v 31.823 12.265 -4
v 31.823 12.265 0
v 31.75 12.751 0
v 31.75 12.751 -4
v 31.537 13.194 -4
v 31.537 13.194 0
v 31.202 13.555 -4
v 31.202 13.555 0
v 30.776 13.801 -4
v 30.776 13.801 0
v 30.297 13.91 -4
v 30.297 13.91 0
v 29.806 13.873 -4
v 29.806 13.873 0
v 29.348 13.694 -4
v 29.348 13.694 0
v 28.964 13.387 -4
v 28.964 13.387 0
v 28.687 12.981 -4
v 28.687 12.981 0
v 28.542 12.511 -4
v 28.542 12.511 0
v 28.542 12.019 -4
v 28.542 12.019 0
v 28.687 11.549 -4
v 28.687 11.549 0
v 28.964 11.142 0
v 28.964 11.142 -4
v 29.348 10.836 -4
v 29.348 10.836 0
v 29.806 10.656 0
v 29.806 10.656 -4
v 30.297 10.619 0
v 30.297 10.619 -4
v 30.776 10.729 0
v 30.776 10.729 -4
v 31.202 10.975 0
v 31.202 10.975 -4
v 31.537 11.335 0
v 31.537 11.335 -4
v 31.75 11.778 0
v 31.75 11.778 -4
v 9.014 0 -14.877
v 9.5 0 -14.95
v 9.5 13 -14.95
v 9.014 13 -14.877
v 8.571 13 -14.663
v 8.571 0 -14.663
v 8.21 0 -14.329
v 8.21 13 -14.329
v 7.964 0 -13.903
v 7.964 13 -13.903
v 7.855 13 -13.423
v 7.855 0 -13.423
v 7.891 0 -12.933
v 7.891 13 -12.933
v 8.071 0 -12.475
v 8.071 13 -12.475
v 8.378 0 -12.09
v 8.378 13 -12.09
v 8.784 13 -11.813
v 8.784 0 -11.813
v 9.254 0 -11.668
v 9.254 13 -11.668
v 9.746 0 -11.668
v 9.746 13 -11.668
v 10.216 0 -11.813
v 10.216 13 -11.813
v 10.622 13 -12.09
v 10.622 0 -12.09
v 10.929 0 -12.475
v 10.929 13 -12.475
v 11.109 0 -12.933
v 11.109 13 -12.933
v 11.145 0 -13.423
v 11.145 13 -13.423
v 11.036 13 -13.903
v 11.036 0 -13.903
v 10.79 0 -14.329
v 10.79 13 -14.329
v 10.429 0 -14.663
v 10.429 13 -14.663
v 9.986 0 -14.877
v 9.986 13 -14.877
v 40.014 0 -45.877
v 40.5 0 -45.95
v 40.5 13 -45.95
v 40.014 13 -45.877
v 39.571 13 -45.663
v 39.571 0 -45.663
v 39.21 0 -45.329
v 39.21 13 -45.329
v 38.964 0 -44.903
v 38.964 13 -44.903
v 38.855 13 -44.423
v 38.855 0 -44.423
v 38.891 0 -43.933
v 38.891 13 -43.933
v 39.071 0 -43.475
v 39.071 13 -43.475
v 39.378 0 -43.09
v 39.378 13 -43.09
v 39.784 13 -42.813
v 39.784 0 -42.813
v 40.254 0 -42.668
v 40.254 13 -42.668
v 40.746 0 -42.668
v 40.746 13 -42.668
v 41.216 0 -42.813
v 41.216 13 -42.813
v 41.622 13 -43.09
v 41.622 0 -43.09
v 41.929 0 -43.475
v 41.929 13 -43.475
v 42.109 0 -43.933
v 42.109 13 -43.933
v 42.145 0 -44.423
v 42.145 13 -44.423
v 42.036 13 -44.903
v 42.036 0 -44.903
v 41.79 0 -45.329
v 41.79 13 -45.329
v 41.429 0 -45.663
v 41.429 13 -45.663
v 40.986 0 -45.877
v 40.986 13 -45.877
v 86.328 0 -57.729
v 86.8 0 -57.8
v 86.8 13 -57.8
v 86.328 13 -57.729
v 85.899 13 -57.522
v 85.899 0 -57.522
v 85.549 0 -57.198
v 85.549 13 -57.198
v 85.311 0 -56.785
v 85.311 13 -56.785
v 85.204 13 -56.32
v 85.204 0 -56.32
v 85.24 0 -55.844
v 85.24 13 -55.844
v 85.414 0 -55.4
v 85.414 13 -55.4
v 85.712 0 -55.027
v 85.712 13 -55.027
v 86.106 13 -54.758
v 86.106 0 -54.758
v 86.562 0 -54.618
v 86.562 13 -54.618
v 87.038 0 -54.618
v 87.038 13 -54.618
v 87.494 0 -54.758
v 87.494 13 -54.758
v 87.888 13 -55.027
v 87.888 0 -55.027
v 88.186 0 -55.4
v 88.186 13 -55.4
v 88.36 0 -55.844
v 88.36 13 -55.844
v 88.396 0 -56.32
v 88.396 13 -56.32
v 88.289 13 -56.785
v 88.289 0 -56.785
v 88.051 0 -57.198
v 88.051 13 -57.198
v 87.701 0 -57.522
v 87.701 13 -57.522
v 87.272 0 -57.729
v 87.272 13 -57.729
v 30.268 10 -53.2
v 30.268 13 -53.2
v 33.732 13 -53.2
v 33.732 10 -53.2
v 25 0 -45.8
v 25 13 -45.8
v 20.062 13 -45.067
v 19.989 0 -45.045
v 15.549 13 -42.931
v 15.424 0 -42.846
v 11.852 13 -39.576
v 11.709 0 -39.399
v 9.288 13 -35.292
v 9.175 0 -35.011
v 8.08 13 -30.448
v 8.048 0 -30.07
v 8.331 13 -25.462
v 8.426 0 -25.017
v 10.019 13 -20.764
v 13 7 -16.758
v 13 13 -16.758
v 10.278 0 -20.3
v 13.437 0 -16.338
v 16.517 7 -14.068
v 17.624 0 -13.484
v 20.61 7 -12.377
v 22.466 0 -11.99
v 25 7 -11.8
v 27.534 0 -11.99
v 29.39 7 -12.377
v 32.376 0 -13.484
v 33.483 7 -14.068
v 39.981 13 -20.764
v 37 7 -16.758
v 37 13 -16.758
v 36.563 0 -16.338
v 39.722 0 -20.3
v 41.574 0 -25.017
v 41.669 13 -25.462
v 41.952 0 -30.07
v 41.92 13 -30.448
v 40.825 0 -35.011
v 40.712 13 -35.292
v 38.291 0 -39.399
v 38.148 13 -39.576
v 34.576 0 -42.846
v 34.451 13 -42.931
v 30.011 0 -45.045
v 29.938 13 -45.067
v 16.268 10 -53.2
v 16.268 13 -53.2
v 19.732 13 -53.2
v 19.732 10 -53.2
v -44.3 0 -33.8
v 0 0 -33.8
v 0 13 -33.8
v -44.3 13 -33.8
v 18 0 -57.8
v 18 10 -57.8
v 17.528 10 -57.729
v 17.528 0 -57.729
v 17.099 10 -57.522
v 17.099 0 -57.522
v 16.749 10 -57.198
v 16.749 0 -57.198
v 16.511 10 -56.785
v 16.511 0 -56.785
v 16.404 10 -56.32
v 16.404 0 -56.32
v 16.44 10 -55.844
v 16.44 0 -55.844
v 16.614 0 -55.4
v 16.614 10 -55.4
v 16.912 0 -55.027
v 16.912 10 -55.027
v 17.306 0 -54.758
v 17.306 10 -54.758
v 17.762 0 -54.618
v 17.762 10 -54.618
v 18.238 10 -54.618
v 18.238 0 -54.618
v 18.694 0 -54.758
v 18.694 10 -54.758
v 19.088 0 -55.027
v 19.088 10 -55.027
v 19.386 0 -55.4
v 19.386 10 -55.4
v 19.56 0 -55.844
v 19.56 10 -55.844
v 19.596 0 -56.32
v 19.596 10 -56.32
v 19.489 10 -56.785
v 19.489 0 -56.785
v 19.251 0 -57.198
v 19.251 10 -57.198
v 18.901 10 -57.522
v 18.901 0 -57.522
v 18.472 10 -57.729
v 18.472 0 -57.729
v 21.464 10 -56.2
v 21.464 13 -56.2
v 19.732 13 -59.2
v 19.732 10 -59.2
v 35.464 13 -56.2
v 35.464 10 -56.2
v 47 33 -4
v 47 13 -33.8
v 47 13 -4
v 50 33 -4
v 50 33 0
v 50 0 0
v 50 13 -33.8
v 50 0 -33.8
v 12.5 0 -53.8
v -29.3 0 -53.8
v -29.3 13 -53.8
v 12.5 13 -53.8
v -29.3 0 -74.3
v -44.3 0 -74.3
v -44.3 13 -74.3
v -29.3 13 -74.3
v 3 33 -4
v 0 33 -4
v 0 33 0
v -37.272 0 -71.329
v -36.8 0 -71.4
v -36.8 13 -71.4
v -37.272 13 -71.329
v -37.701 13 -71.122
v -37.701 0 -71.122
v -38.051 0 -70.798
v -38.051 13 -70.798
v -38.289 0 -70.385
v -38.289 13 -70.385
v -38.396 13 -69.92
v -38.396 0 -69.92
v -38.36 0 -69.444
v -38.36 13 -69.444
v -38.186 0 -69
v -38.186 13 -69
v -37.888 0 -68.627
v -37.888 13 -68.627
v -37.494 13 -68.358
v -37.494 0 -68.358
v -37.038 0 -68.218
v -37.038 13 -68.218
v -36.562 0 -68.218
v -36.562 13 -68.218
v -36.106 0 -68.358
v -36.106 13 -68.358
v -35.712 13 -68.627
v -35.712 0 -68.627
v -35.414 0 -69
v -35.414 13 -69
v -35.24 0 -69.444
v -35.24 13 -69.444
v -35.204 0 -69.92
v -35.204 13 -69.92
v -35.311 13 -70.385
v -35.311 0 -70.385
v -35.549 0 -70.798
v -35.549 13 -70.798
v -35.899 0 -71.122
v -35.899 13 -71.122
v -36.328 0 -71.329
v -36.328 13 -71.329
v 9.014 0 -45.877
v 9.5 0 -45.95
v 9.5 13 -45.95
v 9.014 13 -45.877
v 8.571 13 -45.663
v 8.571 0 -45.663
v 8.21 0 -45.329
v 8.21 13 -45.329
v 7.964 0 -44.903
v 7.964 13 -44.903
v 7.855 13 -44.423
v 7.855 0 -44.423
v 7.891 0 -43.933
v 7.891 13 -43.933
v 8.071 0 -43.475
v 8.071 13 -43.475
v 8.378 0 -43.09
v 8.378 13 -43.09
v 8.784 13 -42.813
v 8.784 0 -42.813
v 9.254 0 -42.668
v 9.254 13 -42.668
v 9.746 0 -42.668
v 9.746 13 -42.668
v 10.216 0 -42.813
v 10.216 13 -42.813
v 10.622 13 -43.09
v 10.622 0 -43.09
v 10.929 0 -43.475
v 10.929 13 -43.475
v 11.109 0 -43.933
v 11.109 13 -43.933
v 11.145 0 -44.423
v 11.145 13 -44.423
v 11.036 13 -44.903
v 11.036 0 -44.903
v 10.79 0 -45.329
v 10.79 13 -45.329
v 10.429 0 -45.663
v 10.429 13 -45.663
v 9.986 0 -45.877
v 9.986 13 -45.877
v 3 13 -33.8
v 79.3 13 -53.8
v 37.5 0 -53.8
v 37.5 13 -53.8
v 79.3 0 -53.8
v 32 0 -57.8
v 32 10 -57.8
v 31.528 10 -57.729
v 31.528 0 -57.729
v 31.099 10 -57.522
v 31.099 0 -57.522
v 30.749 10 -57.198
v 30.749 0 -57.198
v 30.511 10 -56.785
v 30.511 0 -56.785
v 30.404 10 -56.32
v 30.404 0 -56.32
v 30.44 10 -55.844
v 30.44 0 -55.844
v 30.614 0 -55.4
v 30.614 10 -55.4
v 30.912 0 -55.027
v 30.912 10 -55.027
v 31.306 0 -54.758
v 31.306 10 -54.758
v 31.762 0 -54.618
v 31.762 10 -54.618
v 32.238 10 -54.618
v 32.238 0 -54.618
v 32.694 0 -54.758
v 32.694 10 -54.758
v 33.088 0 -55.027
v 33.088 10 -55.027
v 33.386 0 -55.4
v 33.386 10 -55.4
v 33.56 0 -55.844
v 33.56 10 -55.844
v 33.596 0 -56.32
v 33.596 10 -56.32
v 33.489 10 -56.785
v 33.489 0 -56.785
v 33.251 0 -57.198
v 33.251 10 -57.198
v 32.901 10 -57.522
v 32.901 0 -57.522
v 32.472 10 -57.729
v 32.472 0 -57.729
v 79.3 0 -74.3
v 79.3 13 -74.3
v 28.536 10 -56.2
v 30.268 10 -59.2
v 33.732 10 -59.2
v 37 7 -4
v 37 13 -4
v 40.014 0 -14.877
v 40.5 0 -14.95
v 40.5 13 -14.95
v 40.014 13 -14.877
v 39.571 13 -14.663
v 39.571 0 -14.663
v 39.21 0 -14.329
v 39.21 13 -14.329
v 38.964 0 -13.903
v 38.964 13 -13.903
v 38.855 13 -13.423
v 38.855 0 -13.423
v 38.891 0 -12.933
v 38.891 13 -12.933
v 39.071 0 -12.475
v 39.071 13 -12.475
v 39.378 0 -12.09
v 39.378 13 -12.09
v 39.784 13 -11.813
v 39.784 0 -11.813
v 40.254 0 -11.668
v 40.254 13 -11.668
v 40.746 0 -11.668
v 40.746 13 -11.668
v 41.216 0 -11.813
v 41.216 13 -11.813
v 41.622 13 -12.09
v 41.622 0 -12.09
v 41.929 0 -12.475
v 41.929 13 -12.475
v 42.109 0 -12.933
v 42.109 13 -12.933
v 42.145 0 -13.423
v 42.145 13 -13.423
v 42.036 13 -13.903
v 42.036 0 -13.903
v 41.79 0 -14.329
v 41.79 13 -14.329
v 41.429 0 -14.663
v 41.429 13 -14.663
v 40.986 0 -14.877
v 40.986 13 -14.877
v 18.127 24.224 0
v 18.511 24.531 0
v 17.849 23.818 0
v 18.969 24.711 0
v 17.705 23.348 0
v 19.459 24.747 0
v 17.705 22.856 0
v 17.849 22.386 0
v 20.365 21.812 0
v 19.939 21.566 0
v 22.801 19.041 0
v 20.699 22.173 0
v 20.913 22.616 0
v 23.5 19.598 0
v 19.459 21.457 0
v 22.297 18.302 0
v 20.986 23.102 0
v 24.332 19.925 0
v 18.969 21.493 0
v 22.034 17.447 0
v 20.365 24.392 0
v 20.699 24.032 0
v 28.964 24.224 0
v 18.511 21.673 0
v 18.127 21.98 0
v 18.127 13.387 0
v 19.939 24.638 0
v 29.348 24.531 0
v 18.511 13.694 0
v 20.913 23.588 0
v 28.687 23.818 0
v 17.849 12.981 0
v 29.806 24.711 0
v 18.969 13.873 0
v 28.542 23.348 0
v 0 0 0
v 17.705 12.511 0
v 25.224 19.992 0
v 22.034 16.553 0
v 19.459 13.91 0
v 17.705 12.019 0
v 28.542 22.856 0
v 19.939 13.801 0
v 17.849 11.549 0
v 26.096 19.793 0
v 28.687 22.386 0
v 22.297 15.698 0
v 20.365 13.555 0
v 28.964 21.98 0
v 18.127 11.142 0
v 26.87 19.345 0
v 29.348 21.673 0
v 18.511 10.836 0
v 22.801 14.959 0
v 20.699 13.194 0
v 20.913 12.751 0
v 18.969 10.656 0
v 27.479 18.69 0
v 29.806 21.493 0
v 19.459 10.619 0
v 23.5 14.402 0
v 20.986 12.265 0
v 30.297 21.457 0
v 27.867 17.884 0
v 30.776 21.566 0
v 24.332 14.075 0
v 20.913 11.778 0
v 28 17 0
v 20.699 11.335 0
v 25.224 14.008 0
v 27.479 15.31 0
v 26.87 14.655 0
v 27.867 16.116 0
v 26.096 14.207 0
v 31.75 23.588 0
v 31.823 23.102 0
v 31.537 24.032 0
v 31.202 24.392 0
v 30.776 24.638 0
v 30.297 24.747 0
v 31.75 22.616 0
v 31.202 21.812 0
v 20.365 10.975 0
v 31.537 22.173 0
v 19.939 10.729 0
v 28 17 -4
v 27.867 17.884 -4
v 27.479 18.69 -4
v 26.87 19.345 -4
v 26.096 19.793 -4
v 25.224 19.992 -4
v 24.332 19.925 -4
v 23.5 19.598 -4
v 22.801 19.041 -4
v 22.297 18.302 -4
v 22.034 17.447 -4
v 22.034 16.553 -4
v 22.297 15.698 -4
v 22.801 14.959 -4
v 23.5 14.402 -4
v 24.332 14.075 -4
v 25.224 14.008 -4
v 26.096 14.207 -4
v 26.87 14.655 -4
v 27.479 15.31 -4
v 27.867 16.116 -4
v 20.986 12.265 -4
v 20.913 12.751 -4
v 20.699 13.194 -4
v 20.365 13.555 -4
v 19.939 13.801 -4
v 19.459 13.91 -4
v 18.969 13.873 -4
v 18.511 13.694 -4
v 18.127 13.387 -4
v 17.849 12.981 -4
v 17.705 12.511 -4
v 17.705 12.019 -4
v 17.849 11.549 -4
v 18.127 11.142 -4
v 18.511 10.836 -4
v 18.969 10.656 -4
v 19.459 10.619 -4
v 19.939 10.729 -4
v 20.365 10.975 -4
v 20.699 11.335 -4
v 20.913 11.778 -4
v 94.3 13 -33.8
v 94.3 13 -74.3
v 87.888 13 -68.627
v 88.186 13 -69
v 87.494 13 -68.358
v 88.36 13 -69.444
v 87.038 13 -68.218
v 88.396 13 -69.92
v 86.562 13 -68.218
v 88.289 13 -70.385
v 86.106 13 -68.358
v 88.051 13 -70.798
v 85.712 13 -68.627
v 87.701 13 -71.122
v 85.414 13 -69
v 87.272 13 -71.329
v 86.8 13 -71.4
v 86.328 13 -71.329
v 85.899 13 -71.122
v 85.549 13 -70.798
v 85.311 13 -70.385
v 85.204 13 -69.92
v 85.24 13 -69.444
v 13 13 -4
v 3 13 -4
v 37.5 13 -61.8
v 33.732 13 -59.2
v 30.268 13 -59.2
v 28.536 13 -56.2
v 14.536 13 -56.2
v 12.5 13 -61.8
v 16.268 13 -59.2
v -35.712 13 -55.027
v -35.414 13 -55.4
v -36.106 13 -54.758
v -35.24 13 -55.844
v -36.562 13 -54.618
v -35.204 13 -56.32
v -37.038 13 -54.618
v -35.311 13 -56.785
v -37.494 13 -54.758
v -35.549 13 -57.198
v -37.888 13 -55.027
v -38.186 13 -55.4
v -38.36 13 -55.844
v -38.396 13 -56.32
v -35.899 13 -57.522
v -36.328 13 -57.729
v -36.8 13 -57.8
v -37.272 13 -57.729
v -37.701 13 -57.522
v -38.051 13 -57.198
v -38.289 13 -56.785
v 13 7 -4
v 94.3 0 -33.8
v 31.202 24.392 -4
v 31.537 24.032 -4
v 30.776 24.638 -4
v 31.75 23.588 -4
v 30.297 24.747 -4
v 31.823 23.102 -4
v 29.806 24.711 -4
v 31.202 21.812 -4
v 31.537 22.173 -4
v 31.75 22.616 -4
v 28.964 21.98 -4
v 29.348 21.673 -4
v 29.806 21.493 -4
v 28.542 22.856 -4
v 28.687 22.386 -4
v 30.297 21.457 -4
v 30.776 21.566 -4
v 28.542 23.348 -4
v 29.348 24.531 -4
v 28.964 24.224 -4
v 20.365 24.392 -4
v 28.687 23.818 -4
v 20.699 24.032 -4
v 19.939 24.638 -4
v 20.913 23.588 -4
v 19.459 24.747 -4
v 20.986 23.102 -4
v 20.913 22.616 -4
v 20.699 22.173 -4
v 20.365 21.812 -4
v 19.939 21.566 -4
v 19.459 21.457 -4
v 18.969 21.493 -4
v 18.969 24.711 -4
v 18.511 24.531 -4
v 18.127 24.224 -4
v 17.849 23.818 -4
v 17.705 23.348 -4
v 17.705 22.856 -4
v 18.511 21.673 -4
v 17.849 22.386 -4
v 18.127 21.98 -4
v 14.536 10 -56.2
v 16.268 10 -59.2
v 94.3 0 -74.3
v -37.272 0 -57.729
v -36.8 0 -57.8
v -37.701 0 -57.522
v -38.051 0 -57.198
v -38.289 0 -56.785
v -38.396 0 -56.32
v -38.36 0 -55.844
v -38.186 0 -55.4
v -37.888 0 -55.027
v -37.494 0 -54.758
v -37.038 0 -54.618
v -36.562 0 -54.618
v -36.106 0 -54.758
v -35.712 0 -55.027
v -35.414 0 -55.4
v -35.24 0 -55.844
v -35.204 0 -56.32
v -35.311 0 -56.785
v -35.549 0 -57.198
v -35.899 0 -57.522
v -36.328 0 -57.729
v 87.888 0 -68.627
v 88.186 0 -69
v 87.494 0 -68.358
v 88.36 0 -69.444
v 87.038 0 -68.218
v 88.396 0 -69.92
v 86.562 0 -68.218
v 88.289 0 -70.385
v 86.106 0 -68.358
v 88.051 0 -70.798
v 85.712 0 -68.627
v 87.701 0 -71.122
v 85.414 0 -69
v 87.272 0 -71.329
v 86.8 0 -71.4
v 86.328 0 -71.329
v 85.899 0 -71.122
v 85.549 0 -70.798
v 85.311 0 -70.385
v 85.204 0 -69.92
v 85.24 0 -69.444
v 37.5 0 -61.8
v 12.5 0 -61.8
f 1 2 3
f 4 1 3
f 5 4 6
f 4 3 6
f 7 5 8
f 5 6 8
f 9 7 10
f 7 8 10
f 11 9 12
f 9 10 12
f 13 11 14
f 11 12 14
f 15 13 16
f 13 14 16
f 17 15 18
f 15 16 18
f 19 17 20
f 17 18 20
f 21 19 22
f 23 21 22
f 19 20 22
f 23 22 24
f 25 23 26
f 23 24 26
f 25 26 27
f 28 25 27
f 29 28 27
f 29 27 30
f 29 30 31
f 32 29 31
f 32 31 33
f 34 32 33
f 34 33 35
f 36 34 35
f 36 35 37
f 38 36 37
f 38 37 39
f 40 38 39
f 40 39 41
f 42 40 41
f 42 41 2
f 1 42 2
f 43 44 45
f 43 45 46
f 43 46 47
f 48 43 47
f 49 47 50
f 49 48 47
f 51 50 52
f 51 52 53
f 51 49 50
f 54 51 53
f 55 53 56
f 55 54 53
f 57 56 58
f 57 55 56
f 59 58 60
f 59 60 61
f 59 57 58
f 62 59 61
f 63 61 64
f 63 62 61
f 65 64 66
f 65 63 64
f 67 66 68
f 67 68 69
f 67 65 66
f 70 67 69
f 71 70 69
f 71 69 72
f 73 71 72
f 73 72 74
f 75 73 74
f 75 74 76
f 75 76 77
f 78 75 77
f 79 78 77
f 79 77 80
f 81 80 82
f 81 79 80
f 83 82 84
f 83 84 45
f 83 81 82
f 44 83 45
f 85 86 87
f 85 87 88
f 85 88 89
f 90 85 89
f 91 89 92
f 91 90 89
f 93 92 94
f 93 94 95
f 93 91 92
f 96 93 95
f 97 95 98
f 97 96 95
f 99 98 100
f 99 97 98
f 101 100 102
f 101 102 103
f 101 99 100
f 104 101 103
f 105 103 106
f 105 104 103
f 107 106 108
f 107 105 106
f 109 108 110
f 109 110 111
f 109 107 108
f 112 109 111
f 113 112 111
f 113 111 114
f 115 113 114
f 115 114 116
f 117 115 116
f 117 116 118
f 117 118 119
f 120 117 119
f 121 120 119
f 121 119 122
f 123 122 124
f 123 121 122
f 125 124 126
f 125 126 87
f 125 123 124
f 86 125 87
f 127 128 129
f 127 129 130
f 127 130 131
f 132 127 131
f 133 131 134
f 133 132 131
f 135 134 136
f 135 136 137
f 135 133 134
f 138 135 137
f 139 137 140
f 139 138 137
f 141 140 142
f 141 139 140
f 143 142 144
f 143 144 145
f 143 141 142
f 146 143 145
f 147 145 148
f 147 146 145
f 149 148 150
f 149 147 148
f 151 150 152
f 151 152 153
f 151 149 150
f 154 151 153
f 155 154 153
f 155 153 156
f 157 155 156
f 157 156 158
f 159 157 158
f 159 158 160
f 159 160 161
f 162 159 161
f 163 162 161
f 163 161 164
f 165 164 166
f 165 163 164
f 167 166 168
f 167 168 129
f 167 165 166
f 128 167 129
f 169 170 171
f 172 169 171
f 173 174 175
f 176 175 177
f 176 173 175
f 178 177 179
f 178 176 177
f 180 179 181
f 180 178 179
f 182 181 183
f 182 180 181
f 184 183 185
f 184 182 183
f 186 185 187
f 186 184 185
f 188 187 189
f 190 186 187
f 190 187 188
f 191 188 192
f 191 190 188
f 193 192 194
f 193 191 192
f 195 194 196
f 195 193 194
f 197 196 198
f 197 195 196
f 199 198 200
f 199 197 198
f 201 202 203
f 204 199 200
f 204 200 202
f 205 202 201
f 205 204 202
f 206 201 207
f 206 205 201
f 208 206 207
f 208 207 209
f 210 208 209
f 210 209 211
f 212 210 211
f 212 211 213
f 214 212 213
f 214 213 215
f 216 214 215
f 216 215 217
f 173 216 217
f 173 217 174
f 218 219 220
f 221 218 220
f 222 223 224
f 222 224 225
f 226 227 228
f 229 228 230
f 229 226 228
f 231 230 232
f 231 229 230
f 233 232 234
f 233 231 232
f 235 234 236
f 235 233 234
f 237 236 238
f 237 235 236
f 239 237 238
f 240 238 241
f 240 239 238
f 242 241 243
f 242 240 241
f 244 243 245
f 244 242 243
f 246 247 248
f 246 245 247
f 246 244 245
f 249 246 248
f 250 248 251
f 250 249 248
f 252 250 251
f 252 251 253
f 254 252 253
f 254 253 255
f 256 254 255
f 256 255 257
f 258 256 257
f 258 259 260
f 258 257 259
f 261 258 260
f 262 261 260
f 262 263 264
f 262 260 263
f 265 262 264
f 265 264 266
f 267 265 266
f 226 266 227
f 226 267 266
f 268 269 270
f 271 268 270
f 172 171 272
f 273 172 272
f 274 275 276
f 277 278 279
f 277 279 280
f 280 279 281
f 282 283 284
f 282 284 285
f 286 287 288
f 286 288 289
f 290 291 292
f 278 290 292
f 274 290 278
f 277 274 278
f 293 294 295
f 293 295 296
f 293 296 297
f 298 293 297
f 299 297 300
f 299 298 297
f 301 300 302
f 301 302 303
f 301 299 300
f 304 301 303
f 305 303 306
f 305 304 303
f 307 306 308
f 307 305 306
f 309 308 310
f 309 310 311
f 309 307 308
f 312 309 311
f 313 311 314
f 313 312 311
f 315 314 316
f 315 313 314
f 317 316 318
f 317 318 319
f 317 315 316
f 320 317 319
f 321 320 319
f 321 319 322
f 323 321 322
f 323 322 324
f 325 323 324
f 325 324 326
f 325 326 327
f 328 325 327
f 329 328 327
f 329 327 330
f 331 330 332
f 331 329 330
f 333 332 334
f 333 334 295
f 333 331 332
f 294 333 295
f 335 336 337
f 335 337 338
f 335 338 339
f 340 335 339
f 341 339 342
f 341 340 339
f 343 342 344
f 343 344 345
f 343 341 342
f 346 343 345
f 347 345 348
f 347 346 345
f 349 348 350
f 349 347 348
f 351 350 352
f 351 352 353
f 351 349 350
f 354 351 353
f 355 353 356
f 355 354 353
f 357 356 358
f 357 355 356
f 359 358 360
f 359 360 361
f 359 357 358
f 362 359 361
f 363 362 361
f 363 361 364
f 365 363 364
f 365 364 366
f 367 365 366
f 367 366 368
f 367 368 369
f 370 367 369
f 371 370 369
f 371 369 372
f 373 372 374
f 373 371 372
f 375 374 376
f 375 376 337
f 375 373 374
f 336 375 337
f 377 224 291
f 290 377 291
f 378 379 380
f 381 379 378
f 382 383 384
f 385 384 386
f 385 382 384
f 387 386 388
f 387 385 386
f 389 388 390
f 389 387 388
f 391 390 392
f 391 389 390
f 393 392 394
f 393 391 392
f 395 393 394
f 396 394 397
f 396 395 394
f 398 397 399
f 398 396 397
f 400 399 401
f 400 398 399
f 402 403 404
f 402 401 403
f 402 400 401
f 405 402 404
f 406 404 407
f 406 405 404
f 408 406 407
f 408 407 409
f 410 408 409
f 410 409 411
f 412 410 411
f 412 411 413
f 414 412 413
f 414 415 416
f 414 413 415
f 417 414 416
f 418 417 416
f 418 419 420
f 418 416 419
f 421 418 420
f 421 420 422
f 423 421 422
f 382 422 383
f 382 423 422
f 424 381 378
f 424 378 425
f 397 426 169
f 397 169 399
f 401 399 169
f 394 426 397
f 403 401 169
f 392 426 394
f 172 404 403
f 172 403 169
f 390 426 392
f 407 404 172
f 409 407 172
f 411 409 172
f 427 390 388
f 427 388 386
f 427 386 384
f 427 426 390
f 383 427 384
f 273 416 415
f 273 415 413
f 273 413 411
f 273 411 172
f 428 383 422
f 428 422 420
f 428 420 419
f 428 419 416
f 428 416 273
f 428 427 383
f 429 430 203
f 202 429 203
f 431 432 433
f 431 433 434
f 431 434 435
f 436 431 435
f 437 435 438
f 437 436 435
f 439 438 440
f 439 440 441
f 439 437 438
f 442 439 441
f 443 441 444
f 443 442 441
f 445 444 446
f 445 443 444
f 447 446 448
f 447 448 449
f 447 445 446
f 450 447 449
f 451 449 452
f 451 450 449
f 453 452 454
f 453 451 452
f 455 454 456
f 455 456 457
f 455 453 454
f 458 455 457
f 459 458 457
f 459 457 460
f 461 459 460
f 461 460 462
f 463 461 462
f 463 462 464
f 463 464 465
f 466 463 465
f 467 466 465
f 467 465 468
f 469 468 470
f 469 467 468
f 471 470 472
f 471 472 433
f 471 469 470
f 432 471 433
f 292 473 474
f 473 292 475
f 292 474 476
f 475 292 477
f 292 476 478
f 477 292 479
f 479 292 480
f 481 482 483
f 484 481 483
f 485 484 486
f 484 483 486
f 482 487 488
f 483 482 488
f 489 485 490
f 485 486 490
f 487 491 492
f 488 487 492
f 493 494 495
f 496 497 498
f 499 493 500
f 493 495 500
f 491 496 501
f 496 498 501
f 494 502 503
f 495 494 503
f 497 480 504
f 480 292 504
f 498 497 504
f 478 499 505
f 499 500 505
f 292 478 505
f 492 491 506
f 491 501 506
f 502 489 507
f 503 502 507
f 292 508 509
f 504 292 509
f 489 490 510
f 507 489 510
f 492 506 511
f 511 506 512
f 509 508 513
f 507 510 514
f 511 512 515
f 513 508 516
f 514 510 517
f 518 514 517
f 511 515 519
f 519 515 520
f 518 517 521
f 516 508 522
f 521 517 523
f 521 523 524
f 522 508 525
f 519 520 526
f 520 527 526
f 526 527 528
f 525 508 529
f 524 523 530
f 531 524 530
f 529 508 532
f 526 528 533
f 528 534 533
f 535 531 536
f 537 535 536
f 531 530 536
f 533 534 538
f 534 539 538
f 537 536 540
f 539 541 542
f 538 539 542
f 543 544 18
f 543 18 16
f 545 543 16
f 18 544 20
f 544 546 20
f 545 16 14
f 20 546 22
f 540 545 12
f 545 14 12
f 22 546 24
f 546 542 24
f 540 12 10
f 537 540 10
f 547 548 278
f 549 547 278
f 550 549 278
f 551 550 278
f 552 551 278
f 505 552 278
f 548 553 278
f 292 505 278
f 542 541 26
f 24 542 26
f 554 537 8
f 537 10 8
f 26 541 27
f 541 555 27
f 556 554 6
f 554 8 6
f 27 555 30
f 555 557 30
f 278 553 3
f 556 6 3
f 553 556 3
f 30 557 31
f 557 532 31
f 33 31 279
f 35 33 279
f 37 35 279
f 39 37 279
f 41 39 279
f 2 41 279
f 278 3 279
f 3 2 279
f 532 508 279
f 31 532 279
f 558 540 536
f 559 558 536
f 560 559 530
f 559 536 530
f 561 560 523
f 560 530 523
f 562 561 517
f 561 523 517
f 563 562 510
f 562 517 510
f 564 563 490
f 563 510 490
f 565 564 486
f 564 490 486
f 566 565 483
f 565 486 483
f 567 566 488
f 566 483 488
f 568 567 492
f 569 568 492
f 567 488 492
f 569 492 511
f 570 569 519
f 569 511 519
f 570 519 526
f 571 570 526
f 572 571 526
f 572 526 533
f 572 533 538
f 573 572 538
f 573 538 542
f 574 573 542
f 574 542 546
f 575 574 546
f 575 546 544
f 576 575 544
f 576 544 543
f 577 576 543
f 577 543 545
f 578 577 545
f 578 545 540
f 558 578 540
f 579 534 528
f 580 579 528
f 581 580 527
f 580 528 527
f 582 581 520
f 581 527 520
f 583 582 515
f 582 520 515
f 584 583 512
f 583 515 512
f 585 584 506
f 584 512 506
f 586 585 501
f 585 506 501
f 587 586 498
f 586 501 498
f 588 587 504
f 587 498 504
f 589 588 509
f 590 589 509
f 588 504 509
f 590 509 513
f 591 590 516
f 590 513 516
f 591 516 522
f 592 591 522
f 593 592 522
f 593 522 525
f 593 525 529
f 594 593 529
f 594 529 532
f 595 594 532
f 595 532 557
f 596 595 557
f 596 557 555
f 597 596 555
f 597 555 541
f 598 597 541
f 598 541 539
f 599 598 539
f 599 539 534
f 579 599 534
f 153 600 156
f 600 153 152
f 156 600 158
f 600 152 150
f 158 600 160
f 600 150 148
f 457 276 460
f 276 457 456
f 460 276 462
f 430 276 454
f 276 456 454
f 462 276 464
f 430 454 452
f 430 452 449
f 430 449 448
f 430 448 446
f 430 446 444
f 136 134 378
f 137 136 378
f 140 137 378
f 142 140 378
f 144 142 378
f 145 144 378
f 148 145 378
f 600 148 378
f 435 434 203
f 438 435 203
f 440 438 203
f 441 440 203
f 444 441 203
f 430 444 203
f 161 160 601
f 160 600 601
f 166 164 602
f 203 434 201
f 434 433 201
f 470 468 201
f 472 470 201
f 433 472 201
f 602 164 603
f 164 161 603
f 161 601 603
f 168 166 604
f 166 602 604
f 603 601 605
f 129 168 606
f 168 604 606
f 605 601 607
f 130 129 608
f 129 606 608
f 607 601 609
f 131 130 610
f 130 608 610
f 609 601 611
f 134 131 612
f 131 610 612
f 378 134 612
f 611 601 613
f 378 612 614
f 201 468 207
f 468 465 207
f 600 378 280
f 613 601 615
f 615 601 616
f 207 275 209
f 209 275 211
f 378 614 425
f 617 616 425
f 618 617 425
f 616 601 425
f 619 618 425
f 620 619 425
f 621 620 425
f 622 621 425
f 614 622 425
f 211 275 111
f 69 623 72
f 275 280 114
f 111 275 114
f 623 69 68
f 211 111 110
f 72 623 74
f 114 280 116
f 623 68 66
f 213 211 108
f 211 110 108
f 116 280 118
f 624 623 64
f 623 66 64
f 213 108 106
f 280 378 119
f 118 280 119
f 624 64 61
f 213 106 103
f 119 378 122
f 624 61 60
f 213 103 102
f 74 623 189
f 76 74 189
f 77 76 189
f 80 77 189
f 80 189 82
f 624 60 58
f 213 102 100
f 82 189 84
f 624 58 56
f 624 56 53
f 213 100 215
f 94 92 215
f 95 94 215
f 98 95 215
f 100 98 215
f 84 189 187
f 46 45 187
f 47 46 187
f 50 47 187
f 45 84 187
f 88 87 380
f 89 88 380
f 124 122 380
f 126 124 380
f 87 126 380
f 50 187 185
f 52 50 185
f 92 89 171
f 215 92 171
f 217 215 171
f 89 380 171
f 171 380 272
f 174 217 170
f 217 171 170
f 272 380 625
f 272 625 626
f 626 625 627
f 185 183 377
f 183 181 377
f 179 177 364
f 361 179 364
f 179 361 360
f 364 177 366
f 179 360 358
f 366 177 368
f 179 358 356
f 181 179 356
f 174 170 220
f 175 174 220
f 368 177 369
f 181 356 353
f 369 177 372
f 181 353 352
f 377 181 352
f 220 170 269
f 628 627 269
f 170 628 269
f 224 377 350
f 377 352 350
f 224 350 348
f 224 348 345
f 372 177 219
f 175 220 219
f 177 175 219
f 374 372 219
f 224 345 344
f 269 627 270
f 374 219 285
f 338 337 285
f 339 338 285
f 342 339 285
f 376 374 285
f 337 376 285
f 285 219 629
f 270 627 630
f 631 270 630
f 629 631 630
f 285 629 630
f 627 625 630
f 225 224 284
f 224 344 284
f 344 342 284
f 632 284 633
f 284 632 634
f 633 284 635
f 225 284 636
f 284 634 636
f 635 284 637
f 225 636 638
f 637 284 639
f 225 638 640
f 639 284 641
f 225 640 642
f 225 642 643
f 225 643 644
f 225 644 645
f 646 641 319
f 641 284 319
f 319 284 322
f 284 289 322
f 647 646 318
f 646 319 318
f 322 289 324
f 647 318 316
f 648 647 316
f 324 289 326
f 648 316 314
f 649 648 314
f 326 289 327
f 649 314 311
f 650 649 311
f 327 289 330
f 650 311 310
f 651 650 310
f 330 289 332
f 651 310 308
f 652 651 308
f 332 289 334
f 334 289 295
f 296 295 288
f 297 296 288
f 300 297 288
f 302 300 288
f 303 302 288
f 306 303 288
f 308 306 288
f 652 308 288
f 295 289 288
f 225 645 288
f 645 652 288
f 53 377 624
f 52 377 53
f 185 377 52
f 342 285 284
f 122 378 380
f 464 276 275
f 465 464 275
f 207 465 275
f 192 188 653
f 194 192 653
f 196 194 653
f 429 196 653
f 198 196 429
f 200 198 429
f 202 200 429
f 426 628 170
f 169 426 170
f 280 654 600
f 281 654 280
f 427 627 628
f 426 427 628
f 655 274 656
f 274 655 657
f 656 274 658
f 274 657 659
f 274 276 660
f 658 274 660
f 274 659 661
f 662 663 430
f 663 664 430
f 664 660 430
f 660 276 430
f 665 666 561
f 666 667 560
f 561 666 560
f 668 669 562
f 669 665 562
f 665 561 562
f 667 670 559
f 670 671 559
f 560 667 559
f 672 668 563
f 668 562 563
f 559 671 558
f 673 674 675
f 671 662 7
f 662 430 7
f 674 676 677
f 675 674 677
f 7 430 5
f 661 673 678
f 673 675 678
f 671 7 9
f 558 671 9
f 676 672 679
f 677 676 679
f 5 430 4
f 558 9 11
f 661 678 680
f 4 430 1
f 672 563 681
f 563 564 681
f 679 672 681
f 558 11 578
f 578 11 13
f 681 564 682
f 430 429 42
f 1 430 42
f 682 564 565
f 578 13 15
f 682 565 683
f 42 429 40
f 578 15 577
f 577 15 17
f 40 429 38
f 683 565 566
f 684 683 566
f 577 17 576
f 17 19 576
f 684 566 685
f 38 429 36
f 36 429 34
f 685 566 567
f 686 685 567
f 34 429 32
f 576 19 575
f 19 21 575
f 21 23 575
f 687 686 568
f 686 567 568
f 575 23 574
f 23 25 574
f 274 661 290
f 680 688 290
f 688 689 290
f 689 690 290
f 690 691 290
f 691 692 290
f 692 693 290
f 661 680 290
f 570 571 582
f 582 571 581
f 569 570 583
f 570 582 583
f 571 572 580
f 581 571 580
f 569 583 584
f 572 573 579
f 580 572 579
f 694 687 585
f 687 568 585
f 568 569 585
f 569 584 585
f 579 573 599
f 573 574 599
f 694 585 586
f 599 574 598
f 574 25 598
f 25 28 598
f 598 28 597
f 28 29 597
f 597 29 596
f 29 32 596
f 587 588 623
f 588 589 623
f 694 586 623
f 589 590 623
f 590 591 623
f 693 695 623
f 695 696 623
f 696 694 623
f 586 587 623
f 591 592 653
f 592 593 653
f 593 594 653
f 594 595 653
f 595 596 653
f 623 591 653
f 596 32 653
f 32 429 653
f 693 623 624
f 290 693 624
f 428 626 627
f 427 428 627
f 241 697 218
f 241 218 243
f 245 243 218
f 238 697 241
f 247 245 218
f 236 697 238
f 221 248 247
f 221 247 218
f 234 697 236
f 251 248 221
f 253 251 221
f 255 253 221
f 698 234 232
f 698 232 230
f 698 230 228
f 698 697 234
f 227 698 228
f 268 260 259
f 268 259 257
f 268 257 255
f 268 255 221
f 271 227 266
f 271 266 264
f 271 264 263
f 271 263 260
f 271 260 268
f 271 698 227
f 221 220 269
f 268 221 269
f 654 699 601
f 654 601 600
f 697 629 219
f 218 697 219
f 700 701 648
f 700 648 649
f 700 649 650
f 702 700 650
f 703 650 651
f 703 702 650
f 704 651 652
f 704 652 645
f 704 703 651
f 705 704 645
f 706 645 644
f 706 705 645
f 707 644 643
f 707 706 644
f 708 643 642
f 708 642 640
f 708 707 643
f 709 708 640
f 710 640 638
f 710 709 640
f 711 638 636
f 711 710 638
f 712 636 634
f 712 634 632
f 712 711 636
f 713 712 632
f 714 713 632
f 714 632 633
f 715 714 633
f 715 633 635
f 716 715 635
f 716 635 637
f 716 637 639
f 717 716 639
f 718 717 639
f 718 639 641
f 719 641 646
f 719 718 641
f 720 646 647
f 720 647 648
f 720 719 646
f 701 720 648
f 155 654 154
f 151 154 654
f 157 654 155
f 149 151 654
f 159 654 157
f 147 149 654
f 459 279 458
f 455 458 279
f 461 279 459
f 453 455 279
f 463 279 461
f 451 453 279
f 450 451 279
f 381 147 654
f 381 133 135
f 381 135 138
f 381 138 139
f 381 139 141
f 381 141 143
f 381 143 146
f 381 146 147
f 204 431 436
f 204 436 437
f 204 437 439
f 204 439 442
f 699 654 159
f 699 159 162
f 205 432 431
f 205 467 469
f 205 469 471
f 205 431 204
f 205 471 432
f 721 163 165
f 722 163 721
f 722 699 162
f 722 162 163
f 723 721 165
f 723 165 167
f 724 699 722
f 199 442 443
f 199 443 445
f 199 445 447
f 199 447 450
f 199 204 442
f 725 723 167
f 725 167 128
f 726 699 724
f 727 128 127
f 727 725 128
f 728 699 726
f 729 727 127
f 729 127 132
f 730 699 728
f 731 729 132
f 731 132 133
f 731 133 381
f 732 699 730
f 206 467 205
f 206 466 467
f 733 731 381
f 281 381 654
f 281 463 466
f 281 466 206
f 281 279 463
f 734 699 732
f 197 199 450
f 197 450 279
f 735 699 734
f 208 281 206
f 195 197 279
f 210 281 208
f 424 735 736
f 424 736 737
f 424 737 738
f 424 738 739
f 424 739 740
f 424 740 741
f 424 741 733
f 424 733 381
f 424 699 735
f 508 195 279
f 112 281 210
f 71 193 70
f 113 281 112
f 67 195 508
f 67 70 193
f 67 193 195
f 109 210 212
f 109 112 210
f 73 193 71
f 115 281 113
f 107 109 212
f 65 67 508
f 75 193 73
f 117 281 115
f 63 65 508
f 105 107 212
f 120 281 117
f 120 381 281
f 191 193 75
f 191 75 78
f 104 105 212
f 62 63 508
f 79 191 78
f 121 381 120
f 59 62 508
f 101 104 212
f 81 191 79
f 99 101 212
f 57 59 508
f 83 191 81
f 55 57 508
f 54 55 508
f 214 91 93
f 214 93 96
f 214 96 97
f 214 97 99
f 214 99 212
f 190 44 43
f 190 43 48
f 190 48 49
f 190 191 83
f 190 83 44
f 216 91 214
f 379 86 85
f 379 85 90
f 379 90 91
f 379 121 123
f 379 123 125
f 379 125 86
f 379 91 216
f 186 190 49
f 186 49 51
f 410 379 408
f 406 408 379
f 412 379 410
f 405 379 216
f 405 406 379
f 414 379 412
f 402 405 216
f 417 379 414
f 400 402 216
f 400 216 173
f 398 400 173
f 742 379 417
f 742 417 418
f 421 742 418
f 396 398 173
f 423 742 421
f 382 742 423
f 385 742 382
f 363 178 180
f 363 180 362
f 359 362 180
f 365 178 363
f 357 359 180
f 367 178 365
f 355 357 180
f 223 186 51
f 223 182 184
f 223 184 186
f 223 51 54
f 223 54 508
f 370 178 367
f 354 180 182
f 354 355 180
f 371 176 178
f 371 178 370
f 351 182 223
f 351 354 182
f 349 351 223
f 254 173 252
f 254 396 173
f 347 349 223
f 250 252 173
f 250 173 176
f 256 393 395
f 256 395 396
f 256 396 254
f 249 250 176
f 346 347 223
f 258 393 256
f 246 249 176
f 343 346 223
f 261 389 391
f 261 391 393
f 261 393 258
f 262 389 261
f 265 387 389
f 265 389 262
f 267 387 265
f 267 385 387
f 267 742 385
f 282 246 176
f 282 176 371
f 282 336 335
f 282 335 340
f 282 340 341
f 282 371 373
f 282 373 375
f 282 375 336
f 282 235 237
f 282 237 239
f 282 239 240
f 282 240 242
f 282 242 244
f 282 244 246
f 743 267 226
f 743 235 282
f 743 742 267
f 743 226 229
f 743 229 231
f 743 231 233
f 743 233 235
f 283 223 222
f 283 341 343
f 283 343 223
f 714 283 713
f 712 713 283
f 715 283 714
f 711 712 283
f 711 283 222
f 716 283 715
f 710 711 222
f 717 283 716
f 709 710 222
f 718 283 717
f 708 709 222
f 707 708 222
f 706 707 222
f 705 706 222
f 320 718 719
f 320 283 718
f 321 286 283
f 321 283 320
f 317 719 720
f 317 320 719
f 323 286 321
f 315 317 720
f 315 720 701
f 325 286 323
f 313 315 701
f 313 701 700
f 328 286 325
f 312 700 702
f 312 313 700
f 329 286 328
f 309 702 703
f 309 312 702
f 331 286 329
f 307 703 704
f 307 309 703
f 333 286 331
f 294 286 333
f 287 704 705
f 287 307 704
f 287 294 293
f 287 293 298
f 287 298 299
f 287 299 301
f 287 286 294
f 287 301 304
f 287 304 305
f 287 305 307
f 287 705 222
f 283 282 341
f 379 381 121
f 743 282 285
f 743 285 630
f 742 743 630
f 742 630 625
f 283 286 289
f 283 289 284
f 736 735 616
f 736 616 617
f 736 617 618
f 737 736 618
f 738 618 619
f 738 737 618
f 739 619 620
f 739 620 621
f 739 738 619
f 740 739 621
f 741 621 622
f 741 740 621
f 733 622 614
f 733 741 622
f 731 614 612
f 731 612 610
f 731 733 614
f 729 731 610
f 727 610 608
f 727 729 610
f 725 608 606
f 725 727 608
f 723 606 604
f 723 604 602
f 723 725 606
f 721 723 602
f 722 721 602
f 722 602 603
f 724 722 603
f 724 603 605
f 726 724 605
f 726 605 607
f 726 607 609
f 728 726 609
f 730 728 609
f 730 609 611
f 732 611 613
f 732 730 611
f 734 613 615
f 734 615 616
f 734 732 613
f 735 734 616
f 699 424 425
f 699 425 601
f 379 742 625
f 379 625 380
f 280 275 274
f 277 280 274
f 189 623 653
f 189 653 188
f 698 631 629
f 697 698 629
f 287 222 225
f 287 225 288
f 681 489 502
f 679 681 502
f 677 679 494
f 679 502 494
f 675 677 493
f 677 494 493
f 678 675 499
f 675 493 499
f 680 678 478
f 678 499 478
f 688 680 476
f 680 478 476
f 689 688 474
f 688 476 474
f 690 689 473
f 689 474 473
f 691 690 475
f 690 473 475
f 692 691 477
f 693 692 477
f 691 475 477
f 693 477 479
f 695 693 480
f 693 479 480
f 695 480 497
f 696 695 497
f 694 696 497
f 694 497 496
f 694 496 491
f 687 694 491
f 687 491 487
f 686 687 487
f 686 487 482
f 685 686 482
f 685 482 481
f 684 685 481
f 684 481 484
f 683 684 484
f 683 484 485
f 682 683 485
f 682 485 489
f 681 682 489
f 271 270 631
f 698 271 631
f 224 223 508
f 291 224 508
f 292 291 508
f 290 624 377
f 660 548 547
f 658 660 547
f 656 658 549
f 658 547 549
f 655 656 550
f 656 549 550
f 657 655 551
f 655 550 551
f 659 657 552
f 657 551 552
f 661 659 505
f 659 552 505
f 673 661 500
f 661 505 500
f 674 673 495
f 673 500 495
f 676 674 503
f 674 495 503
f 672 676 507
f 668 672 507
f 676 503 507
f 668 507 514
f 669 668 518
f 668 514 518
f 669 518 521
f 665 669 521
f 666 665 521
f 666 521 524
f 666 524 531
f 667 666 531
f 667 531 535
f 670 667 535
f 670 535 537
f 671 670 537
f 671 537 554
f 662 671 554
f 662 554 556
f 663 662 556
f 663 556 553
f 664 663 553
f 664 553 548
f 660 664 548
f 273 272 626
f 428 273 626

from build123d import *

# Parameters (mm, degrees)
SKETCH_2_R          = 1.6
SKETCH_2_R_2        = 17
SKETCH_2_R_3        = 1.65
EXTRUDE_2_DEPTH     = 13
CUT_EXTRUDE_1_DEPTH = 3
EXTRUDE_3_DEPTH     = 20
CUT_EXTRUDE_2_DEPTH = 125.506947597
SKETCH_8_W          = 24
SKETCH_8_H          = 20
CUT_EXTRUDE_3_DEPTH = 6
SKETCH_10_R         = 3
SKETCH_10_R_2       = 1.65
CUT_EXTRUDE_4_DEPTH = 5


with BuildPart() as part:
    # 草图2 → 凸台-拉伸2 (new body)
    with BuildSketch(Plane(origin=(0, 0, 0), x_dir=(1, 0, 0), z_dir=(0, 1, 0))):
        Polygon((-44.3, 33.8), (-44.3, 74.3), (-29.3, 74.3), (-29.3, 53.8), (12.5, 53.8), (12.5, 61.8), (37.5, 61.8), (37.5, 53.8), (79.3, 53.8), (79.3, 74.3), (94.3, 74.3), (94.3, 33.8), (50, 33.8), (50, 0), (0, 0), (0, 33.8), align=None)
        with Locations(Location((-36.8, 69.8, 0), (0, 0, 90))):
            Circle(SKETCH_2_R, mode=Mode.SUBTRACT)
        with Locations(Location((-36.8, 56.2, 0), (0, 0, 90))):
            Circle(SKETCH_2_R, mode=Mode.SUBTRACT)
        with Locations(Location((86.8, 69.8, 0), (0, 0, 90))):
            Circle(SKETCH_2_R, mode=Mode.SUBTRACT)
        with Locations(Location((86.8, 56.2, 0), (0, 0, 90))):
            Circle(SKETCH_2_R, mode=Mode.SUBTRACT)
        with Locations(Location((18, 56.2, 0), (0, 0, 90))):
            Circle(SKETCH_2_R, mode=Mode.SUBTRACT)
        with Locations(Location((32, 56.2, 0), (0, 0, 90))):
            Circle(SKETCH_2_R, mode=Mode.SUBTRACT)
        with Locations(Location((25, 28.8, 0), (0, 0, 90))):
            Circle(SKETCH_2_R_2, mode=Mode.SUBTRACT)
        with Locations(Location((40.5, 44.3, 0), (0, 0, 90))):
            Circle(SKETCH_2_R_3, mode=Mode.SUBTRACT)
        with Locations(Location((40.5, 13.3, 0), (0, 0, 90))):
            Circle(SKETCH_2_R_3, mode=Mode.SUBTRACT)
        with Locations(Location((9.5, 13.3, 0), (0, 0, 90))):
            Circle(SKETCH_2_R_3, mode=Mode.SUBTRACT)
        with Locations(Location((9.5, 44.3, 0), (0, 0, 90))):
            Circle(SKETCH_2_R_3, mode=Mode.SUBTRACT)
    extrude(amount=EXTRUDE_2_DEPTH)

    # 草图3 → 切除-拉伸1 (cut)
    with BuildSketch(Plane(origin=(0, 13, 0), x_dir=(1, 0, 0), z_dir=(0, 1, 0))):
        Polygon((21.464101615, 56.2), (19.732050808, 59.2), (16.267949192, 59.2), (14.535898385, 56.2), (16.267949192, 53.2), (19.732050808, 53.2), align=None)
        Polygon((35.464101615, 56.2), (33.732050808, 59.2), (30.267949192, 59.2), (28.535898385, 56.2), (30.267949192, 53.2), (33.732050808, 53.2), align=None)
    extrude(amount=-CUT_EXTRUDE_1_DEPTH, mode=Mode.SUBTRACT)

    # 草图6 → 凸台-拉伸3 (add)
    with BuildSketch(Plane(origin=(0, 13, 0), x_dir=(1, 0, 0), z_dir=(0, 1, 0))):
        Polygon((0, 33.8), (0, 0), (50, 0), (50, 33.8), (47, 33.8), (47, 4), (3, 4), (3, 33.8), align=None)
    extrude(amount=EXTRUDE_3_DEPTH)

    # 草图7 → 切除-拉伸2 (cut, through all)
    with BuildSketch(Plane.ZY):
        Polygon((-33.8, 13), (-4, 33), (-33.8, 33), align=None)
    extrude(amount=-CUT_EXTRUDE_2_DEPTH, mode=Mode.SUBTRACT)

    # 草图8 → 切除-拉伸3 (cut)
    with BuildSketch(Plane(origin=(0, 13, 0), x_dir=(1, 0, 0), z_dir=(0, 1, 0))):
        with Locations((25, 14)):
            Rectangle(SKETCH_8_W, SKETCH_8_H)
    extrude(amount=-CUT_EXTRUDE_3_DEPTH, mode=Mode.SUBTRACT)

    # 草图10 → 切除-拉伸4 (cut)
    with BuildSketch(Plane.XY):
        with Locations((25, 17)):
            Circle(SKETCH_10_R)
        with Locations((30.173451969, 23.102081179)):
            Circle(SKETCH_10_R_2)
        with Locations((30.173451969, 12.264714161)):
            Circle(SKETCH_10_R_2)
        with Locations((19.336084951, 12.264714161)):
            Circle(SKETCH_10_R_2)
        with Locations((19.336084951, 23.102081179)):
            Circle(SKETCH_10_R_2)
    extrude(amount=-CUT_EXTRUDE_4_DEPTH, mode=Mode.SUBTRACT)


solid = part.part
